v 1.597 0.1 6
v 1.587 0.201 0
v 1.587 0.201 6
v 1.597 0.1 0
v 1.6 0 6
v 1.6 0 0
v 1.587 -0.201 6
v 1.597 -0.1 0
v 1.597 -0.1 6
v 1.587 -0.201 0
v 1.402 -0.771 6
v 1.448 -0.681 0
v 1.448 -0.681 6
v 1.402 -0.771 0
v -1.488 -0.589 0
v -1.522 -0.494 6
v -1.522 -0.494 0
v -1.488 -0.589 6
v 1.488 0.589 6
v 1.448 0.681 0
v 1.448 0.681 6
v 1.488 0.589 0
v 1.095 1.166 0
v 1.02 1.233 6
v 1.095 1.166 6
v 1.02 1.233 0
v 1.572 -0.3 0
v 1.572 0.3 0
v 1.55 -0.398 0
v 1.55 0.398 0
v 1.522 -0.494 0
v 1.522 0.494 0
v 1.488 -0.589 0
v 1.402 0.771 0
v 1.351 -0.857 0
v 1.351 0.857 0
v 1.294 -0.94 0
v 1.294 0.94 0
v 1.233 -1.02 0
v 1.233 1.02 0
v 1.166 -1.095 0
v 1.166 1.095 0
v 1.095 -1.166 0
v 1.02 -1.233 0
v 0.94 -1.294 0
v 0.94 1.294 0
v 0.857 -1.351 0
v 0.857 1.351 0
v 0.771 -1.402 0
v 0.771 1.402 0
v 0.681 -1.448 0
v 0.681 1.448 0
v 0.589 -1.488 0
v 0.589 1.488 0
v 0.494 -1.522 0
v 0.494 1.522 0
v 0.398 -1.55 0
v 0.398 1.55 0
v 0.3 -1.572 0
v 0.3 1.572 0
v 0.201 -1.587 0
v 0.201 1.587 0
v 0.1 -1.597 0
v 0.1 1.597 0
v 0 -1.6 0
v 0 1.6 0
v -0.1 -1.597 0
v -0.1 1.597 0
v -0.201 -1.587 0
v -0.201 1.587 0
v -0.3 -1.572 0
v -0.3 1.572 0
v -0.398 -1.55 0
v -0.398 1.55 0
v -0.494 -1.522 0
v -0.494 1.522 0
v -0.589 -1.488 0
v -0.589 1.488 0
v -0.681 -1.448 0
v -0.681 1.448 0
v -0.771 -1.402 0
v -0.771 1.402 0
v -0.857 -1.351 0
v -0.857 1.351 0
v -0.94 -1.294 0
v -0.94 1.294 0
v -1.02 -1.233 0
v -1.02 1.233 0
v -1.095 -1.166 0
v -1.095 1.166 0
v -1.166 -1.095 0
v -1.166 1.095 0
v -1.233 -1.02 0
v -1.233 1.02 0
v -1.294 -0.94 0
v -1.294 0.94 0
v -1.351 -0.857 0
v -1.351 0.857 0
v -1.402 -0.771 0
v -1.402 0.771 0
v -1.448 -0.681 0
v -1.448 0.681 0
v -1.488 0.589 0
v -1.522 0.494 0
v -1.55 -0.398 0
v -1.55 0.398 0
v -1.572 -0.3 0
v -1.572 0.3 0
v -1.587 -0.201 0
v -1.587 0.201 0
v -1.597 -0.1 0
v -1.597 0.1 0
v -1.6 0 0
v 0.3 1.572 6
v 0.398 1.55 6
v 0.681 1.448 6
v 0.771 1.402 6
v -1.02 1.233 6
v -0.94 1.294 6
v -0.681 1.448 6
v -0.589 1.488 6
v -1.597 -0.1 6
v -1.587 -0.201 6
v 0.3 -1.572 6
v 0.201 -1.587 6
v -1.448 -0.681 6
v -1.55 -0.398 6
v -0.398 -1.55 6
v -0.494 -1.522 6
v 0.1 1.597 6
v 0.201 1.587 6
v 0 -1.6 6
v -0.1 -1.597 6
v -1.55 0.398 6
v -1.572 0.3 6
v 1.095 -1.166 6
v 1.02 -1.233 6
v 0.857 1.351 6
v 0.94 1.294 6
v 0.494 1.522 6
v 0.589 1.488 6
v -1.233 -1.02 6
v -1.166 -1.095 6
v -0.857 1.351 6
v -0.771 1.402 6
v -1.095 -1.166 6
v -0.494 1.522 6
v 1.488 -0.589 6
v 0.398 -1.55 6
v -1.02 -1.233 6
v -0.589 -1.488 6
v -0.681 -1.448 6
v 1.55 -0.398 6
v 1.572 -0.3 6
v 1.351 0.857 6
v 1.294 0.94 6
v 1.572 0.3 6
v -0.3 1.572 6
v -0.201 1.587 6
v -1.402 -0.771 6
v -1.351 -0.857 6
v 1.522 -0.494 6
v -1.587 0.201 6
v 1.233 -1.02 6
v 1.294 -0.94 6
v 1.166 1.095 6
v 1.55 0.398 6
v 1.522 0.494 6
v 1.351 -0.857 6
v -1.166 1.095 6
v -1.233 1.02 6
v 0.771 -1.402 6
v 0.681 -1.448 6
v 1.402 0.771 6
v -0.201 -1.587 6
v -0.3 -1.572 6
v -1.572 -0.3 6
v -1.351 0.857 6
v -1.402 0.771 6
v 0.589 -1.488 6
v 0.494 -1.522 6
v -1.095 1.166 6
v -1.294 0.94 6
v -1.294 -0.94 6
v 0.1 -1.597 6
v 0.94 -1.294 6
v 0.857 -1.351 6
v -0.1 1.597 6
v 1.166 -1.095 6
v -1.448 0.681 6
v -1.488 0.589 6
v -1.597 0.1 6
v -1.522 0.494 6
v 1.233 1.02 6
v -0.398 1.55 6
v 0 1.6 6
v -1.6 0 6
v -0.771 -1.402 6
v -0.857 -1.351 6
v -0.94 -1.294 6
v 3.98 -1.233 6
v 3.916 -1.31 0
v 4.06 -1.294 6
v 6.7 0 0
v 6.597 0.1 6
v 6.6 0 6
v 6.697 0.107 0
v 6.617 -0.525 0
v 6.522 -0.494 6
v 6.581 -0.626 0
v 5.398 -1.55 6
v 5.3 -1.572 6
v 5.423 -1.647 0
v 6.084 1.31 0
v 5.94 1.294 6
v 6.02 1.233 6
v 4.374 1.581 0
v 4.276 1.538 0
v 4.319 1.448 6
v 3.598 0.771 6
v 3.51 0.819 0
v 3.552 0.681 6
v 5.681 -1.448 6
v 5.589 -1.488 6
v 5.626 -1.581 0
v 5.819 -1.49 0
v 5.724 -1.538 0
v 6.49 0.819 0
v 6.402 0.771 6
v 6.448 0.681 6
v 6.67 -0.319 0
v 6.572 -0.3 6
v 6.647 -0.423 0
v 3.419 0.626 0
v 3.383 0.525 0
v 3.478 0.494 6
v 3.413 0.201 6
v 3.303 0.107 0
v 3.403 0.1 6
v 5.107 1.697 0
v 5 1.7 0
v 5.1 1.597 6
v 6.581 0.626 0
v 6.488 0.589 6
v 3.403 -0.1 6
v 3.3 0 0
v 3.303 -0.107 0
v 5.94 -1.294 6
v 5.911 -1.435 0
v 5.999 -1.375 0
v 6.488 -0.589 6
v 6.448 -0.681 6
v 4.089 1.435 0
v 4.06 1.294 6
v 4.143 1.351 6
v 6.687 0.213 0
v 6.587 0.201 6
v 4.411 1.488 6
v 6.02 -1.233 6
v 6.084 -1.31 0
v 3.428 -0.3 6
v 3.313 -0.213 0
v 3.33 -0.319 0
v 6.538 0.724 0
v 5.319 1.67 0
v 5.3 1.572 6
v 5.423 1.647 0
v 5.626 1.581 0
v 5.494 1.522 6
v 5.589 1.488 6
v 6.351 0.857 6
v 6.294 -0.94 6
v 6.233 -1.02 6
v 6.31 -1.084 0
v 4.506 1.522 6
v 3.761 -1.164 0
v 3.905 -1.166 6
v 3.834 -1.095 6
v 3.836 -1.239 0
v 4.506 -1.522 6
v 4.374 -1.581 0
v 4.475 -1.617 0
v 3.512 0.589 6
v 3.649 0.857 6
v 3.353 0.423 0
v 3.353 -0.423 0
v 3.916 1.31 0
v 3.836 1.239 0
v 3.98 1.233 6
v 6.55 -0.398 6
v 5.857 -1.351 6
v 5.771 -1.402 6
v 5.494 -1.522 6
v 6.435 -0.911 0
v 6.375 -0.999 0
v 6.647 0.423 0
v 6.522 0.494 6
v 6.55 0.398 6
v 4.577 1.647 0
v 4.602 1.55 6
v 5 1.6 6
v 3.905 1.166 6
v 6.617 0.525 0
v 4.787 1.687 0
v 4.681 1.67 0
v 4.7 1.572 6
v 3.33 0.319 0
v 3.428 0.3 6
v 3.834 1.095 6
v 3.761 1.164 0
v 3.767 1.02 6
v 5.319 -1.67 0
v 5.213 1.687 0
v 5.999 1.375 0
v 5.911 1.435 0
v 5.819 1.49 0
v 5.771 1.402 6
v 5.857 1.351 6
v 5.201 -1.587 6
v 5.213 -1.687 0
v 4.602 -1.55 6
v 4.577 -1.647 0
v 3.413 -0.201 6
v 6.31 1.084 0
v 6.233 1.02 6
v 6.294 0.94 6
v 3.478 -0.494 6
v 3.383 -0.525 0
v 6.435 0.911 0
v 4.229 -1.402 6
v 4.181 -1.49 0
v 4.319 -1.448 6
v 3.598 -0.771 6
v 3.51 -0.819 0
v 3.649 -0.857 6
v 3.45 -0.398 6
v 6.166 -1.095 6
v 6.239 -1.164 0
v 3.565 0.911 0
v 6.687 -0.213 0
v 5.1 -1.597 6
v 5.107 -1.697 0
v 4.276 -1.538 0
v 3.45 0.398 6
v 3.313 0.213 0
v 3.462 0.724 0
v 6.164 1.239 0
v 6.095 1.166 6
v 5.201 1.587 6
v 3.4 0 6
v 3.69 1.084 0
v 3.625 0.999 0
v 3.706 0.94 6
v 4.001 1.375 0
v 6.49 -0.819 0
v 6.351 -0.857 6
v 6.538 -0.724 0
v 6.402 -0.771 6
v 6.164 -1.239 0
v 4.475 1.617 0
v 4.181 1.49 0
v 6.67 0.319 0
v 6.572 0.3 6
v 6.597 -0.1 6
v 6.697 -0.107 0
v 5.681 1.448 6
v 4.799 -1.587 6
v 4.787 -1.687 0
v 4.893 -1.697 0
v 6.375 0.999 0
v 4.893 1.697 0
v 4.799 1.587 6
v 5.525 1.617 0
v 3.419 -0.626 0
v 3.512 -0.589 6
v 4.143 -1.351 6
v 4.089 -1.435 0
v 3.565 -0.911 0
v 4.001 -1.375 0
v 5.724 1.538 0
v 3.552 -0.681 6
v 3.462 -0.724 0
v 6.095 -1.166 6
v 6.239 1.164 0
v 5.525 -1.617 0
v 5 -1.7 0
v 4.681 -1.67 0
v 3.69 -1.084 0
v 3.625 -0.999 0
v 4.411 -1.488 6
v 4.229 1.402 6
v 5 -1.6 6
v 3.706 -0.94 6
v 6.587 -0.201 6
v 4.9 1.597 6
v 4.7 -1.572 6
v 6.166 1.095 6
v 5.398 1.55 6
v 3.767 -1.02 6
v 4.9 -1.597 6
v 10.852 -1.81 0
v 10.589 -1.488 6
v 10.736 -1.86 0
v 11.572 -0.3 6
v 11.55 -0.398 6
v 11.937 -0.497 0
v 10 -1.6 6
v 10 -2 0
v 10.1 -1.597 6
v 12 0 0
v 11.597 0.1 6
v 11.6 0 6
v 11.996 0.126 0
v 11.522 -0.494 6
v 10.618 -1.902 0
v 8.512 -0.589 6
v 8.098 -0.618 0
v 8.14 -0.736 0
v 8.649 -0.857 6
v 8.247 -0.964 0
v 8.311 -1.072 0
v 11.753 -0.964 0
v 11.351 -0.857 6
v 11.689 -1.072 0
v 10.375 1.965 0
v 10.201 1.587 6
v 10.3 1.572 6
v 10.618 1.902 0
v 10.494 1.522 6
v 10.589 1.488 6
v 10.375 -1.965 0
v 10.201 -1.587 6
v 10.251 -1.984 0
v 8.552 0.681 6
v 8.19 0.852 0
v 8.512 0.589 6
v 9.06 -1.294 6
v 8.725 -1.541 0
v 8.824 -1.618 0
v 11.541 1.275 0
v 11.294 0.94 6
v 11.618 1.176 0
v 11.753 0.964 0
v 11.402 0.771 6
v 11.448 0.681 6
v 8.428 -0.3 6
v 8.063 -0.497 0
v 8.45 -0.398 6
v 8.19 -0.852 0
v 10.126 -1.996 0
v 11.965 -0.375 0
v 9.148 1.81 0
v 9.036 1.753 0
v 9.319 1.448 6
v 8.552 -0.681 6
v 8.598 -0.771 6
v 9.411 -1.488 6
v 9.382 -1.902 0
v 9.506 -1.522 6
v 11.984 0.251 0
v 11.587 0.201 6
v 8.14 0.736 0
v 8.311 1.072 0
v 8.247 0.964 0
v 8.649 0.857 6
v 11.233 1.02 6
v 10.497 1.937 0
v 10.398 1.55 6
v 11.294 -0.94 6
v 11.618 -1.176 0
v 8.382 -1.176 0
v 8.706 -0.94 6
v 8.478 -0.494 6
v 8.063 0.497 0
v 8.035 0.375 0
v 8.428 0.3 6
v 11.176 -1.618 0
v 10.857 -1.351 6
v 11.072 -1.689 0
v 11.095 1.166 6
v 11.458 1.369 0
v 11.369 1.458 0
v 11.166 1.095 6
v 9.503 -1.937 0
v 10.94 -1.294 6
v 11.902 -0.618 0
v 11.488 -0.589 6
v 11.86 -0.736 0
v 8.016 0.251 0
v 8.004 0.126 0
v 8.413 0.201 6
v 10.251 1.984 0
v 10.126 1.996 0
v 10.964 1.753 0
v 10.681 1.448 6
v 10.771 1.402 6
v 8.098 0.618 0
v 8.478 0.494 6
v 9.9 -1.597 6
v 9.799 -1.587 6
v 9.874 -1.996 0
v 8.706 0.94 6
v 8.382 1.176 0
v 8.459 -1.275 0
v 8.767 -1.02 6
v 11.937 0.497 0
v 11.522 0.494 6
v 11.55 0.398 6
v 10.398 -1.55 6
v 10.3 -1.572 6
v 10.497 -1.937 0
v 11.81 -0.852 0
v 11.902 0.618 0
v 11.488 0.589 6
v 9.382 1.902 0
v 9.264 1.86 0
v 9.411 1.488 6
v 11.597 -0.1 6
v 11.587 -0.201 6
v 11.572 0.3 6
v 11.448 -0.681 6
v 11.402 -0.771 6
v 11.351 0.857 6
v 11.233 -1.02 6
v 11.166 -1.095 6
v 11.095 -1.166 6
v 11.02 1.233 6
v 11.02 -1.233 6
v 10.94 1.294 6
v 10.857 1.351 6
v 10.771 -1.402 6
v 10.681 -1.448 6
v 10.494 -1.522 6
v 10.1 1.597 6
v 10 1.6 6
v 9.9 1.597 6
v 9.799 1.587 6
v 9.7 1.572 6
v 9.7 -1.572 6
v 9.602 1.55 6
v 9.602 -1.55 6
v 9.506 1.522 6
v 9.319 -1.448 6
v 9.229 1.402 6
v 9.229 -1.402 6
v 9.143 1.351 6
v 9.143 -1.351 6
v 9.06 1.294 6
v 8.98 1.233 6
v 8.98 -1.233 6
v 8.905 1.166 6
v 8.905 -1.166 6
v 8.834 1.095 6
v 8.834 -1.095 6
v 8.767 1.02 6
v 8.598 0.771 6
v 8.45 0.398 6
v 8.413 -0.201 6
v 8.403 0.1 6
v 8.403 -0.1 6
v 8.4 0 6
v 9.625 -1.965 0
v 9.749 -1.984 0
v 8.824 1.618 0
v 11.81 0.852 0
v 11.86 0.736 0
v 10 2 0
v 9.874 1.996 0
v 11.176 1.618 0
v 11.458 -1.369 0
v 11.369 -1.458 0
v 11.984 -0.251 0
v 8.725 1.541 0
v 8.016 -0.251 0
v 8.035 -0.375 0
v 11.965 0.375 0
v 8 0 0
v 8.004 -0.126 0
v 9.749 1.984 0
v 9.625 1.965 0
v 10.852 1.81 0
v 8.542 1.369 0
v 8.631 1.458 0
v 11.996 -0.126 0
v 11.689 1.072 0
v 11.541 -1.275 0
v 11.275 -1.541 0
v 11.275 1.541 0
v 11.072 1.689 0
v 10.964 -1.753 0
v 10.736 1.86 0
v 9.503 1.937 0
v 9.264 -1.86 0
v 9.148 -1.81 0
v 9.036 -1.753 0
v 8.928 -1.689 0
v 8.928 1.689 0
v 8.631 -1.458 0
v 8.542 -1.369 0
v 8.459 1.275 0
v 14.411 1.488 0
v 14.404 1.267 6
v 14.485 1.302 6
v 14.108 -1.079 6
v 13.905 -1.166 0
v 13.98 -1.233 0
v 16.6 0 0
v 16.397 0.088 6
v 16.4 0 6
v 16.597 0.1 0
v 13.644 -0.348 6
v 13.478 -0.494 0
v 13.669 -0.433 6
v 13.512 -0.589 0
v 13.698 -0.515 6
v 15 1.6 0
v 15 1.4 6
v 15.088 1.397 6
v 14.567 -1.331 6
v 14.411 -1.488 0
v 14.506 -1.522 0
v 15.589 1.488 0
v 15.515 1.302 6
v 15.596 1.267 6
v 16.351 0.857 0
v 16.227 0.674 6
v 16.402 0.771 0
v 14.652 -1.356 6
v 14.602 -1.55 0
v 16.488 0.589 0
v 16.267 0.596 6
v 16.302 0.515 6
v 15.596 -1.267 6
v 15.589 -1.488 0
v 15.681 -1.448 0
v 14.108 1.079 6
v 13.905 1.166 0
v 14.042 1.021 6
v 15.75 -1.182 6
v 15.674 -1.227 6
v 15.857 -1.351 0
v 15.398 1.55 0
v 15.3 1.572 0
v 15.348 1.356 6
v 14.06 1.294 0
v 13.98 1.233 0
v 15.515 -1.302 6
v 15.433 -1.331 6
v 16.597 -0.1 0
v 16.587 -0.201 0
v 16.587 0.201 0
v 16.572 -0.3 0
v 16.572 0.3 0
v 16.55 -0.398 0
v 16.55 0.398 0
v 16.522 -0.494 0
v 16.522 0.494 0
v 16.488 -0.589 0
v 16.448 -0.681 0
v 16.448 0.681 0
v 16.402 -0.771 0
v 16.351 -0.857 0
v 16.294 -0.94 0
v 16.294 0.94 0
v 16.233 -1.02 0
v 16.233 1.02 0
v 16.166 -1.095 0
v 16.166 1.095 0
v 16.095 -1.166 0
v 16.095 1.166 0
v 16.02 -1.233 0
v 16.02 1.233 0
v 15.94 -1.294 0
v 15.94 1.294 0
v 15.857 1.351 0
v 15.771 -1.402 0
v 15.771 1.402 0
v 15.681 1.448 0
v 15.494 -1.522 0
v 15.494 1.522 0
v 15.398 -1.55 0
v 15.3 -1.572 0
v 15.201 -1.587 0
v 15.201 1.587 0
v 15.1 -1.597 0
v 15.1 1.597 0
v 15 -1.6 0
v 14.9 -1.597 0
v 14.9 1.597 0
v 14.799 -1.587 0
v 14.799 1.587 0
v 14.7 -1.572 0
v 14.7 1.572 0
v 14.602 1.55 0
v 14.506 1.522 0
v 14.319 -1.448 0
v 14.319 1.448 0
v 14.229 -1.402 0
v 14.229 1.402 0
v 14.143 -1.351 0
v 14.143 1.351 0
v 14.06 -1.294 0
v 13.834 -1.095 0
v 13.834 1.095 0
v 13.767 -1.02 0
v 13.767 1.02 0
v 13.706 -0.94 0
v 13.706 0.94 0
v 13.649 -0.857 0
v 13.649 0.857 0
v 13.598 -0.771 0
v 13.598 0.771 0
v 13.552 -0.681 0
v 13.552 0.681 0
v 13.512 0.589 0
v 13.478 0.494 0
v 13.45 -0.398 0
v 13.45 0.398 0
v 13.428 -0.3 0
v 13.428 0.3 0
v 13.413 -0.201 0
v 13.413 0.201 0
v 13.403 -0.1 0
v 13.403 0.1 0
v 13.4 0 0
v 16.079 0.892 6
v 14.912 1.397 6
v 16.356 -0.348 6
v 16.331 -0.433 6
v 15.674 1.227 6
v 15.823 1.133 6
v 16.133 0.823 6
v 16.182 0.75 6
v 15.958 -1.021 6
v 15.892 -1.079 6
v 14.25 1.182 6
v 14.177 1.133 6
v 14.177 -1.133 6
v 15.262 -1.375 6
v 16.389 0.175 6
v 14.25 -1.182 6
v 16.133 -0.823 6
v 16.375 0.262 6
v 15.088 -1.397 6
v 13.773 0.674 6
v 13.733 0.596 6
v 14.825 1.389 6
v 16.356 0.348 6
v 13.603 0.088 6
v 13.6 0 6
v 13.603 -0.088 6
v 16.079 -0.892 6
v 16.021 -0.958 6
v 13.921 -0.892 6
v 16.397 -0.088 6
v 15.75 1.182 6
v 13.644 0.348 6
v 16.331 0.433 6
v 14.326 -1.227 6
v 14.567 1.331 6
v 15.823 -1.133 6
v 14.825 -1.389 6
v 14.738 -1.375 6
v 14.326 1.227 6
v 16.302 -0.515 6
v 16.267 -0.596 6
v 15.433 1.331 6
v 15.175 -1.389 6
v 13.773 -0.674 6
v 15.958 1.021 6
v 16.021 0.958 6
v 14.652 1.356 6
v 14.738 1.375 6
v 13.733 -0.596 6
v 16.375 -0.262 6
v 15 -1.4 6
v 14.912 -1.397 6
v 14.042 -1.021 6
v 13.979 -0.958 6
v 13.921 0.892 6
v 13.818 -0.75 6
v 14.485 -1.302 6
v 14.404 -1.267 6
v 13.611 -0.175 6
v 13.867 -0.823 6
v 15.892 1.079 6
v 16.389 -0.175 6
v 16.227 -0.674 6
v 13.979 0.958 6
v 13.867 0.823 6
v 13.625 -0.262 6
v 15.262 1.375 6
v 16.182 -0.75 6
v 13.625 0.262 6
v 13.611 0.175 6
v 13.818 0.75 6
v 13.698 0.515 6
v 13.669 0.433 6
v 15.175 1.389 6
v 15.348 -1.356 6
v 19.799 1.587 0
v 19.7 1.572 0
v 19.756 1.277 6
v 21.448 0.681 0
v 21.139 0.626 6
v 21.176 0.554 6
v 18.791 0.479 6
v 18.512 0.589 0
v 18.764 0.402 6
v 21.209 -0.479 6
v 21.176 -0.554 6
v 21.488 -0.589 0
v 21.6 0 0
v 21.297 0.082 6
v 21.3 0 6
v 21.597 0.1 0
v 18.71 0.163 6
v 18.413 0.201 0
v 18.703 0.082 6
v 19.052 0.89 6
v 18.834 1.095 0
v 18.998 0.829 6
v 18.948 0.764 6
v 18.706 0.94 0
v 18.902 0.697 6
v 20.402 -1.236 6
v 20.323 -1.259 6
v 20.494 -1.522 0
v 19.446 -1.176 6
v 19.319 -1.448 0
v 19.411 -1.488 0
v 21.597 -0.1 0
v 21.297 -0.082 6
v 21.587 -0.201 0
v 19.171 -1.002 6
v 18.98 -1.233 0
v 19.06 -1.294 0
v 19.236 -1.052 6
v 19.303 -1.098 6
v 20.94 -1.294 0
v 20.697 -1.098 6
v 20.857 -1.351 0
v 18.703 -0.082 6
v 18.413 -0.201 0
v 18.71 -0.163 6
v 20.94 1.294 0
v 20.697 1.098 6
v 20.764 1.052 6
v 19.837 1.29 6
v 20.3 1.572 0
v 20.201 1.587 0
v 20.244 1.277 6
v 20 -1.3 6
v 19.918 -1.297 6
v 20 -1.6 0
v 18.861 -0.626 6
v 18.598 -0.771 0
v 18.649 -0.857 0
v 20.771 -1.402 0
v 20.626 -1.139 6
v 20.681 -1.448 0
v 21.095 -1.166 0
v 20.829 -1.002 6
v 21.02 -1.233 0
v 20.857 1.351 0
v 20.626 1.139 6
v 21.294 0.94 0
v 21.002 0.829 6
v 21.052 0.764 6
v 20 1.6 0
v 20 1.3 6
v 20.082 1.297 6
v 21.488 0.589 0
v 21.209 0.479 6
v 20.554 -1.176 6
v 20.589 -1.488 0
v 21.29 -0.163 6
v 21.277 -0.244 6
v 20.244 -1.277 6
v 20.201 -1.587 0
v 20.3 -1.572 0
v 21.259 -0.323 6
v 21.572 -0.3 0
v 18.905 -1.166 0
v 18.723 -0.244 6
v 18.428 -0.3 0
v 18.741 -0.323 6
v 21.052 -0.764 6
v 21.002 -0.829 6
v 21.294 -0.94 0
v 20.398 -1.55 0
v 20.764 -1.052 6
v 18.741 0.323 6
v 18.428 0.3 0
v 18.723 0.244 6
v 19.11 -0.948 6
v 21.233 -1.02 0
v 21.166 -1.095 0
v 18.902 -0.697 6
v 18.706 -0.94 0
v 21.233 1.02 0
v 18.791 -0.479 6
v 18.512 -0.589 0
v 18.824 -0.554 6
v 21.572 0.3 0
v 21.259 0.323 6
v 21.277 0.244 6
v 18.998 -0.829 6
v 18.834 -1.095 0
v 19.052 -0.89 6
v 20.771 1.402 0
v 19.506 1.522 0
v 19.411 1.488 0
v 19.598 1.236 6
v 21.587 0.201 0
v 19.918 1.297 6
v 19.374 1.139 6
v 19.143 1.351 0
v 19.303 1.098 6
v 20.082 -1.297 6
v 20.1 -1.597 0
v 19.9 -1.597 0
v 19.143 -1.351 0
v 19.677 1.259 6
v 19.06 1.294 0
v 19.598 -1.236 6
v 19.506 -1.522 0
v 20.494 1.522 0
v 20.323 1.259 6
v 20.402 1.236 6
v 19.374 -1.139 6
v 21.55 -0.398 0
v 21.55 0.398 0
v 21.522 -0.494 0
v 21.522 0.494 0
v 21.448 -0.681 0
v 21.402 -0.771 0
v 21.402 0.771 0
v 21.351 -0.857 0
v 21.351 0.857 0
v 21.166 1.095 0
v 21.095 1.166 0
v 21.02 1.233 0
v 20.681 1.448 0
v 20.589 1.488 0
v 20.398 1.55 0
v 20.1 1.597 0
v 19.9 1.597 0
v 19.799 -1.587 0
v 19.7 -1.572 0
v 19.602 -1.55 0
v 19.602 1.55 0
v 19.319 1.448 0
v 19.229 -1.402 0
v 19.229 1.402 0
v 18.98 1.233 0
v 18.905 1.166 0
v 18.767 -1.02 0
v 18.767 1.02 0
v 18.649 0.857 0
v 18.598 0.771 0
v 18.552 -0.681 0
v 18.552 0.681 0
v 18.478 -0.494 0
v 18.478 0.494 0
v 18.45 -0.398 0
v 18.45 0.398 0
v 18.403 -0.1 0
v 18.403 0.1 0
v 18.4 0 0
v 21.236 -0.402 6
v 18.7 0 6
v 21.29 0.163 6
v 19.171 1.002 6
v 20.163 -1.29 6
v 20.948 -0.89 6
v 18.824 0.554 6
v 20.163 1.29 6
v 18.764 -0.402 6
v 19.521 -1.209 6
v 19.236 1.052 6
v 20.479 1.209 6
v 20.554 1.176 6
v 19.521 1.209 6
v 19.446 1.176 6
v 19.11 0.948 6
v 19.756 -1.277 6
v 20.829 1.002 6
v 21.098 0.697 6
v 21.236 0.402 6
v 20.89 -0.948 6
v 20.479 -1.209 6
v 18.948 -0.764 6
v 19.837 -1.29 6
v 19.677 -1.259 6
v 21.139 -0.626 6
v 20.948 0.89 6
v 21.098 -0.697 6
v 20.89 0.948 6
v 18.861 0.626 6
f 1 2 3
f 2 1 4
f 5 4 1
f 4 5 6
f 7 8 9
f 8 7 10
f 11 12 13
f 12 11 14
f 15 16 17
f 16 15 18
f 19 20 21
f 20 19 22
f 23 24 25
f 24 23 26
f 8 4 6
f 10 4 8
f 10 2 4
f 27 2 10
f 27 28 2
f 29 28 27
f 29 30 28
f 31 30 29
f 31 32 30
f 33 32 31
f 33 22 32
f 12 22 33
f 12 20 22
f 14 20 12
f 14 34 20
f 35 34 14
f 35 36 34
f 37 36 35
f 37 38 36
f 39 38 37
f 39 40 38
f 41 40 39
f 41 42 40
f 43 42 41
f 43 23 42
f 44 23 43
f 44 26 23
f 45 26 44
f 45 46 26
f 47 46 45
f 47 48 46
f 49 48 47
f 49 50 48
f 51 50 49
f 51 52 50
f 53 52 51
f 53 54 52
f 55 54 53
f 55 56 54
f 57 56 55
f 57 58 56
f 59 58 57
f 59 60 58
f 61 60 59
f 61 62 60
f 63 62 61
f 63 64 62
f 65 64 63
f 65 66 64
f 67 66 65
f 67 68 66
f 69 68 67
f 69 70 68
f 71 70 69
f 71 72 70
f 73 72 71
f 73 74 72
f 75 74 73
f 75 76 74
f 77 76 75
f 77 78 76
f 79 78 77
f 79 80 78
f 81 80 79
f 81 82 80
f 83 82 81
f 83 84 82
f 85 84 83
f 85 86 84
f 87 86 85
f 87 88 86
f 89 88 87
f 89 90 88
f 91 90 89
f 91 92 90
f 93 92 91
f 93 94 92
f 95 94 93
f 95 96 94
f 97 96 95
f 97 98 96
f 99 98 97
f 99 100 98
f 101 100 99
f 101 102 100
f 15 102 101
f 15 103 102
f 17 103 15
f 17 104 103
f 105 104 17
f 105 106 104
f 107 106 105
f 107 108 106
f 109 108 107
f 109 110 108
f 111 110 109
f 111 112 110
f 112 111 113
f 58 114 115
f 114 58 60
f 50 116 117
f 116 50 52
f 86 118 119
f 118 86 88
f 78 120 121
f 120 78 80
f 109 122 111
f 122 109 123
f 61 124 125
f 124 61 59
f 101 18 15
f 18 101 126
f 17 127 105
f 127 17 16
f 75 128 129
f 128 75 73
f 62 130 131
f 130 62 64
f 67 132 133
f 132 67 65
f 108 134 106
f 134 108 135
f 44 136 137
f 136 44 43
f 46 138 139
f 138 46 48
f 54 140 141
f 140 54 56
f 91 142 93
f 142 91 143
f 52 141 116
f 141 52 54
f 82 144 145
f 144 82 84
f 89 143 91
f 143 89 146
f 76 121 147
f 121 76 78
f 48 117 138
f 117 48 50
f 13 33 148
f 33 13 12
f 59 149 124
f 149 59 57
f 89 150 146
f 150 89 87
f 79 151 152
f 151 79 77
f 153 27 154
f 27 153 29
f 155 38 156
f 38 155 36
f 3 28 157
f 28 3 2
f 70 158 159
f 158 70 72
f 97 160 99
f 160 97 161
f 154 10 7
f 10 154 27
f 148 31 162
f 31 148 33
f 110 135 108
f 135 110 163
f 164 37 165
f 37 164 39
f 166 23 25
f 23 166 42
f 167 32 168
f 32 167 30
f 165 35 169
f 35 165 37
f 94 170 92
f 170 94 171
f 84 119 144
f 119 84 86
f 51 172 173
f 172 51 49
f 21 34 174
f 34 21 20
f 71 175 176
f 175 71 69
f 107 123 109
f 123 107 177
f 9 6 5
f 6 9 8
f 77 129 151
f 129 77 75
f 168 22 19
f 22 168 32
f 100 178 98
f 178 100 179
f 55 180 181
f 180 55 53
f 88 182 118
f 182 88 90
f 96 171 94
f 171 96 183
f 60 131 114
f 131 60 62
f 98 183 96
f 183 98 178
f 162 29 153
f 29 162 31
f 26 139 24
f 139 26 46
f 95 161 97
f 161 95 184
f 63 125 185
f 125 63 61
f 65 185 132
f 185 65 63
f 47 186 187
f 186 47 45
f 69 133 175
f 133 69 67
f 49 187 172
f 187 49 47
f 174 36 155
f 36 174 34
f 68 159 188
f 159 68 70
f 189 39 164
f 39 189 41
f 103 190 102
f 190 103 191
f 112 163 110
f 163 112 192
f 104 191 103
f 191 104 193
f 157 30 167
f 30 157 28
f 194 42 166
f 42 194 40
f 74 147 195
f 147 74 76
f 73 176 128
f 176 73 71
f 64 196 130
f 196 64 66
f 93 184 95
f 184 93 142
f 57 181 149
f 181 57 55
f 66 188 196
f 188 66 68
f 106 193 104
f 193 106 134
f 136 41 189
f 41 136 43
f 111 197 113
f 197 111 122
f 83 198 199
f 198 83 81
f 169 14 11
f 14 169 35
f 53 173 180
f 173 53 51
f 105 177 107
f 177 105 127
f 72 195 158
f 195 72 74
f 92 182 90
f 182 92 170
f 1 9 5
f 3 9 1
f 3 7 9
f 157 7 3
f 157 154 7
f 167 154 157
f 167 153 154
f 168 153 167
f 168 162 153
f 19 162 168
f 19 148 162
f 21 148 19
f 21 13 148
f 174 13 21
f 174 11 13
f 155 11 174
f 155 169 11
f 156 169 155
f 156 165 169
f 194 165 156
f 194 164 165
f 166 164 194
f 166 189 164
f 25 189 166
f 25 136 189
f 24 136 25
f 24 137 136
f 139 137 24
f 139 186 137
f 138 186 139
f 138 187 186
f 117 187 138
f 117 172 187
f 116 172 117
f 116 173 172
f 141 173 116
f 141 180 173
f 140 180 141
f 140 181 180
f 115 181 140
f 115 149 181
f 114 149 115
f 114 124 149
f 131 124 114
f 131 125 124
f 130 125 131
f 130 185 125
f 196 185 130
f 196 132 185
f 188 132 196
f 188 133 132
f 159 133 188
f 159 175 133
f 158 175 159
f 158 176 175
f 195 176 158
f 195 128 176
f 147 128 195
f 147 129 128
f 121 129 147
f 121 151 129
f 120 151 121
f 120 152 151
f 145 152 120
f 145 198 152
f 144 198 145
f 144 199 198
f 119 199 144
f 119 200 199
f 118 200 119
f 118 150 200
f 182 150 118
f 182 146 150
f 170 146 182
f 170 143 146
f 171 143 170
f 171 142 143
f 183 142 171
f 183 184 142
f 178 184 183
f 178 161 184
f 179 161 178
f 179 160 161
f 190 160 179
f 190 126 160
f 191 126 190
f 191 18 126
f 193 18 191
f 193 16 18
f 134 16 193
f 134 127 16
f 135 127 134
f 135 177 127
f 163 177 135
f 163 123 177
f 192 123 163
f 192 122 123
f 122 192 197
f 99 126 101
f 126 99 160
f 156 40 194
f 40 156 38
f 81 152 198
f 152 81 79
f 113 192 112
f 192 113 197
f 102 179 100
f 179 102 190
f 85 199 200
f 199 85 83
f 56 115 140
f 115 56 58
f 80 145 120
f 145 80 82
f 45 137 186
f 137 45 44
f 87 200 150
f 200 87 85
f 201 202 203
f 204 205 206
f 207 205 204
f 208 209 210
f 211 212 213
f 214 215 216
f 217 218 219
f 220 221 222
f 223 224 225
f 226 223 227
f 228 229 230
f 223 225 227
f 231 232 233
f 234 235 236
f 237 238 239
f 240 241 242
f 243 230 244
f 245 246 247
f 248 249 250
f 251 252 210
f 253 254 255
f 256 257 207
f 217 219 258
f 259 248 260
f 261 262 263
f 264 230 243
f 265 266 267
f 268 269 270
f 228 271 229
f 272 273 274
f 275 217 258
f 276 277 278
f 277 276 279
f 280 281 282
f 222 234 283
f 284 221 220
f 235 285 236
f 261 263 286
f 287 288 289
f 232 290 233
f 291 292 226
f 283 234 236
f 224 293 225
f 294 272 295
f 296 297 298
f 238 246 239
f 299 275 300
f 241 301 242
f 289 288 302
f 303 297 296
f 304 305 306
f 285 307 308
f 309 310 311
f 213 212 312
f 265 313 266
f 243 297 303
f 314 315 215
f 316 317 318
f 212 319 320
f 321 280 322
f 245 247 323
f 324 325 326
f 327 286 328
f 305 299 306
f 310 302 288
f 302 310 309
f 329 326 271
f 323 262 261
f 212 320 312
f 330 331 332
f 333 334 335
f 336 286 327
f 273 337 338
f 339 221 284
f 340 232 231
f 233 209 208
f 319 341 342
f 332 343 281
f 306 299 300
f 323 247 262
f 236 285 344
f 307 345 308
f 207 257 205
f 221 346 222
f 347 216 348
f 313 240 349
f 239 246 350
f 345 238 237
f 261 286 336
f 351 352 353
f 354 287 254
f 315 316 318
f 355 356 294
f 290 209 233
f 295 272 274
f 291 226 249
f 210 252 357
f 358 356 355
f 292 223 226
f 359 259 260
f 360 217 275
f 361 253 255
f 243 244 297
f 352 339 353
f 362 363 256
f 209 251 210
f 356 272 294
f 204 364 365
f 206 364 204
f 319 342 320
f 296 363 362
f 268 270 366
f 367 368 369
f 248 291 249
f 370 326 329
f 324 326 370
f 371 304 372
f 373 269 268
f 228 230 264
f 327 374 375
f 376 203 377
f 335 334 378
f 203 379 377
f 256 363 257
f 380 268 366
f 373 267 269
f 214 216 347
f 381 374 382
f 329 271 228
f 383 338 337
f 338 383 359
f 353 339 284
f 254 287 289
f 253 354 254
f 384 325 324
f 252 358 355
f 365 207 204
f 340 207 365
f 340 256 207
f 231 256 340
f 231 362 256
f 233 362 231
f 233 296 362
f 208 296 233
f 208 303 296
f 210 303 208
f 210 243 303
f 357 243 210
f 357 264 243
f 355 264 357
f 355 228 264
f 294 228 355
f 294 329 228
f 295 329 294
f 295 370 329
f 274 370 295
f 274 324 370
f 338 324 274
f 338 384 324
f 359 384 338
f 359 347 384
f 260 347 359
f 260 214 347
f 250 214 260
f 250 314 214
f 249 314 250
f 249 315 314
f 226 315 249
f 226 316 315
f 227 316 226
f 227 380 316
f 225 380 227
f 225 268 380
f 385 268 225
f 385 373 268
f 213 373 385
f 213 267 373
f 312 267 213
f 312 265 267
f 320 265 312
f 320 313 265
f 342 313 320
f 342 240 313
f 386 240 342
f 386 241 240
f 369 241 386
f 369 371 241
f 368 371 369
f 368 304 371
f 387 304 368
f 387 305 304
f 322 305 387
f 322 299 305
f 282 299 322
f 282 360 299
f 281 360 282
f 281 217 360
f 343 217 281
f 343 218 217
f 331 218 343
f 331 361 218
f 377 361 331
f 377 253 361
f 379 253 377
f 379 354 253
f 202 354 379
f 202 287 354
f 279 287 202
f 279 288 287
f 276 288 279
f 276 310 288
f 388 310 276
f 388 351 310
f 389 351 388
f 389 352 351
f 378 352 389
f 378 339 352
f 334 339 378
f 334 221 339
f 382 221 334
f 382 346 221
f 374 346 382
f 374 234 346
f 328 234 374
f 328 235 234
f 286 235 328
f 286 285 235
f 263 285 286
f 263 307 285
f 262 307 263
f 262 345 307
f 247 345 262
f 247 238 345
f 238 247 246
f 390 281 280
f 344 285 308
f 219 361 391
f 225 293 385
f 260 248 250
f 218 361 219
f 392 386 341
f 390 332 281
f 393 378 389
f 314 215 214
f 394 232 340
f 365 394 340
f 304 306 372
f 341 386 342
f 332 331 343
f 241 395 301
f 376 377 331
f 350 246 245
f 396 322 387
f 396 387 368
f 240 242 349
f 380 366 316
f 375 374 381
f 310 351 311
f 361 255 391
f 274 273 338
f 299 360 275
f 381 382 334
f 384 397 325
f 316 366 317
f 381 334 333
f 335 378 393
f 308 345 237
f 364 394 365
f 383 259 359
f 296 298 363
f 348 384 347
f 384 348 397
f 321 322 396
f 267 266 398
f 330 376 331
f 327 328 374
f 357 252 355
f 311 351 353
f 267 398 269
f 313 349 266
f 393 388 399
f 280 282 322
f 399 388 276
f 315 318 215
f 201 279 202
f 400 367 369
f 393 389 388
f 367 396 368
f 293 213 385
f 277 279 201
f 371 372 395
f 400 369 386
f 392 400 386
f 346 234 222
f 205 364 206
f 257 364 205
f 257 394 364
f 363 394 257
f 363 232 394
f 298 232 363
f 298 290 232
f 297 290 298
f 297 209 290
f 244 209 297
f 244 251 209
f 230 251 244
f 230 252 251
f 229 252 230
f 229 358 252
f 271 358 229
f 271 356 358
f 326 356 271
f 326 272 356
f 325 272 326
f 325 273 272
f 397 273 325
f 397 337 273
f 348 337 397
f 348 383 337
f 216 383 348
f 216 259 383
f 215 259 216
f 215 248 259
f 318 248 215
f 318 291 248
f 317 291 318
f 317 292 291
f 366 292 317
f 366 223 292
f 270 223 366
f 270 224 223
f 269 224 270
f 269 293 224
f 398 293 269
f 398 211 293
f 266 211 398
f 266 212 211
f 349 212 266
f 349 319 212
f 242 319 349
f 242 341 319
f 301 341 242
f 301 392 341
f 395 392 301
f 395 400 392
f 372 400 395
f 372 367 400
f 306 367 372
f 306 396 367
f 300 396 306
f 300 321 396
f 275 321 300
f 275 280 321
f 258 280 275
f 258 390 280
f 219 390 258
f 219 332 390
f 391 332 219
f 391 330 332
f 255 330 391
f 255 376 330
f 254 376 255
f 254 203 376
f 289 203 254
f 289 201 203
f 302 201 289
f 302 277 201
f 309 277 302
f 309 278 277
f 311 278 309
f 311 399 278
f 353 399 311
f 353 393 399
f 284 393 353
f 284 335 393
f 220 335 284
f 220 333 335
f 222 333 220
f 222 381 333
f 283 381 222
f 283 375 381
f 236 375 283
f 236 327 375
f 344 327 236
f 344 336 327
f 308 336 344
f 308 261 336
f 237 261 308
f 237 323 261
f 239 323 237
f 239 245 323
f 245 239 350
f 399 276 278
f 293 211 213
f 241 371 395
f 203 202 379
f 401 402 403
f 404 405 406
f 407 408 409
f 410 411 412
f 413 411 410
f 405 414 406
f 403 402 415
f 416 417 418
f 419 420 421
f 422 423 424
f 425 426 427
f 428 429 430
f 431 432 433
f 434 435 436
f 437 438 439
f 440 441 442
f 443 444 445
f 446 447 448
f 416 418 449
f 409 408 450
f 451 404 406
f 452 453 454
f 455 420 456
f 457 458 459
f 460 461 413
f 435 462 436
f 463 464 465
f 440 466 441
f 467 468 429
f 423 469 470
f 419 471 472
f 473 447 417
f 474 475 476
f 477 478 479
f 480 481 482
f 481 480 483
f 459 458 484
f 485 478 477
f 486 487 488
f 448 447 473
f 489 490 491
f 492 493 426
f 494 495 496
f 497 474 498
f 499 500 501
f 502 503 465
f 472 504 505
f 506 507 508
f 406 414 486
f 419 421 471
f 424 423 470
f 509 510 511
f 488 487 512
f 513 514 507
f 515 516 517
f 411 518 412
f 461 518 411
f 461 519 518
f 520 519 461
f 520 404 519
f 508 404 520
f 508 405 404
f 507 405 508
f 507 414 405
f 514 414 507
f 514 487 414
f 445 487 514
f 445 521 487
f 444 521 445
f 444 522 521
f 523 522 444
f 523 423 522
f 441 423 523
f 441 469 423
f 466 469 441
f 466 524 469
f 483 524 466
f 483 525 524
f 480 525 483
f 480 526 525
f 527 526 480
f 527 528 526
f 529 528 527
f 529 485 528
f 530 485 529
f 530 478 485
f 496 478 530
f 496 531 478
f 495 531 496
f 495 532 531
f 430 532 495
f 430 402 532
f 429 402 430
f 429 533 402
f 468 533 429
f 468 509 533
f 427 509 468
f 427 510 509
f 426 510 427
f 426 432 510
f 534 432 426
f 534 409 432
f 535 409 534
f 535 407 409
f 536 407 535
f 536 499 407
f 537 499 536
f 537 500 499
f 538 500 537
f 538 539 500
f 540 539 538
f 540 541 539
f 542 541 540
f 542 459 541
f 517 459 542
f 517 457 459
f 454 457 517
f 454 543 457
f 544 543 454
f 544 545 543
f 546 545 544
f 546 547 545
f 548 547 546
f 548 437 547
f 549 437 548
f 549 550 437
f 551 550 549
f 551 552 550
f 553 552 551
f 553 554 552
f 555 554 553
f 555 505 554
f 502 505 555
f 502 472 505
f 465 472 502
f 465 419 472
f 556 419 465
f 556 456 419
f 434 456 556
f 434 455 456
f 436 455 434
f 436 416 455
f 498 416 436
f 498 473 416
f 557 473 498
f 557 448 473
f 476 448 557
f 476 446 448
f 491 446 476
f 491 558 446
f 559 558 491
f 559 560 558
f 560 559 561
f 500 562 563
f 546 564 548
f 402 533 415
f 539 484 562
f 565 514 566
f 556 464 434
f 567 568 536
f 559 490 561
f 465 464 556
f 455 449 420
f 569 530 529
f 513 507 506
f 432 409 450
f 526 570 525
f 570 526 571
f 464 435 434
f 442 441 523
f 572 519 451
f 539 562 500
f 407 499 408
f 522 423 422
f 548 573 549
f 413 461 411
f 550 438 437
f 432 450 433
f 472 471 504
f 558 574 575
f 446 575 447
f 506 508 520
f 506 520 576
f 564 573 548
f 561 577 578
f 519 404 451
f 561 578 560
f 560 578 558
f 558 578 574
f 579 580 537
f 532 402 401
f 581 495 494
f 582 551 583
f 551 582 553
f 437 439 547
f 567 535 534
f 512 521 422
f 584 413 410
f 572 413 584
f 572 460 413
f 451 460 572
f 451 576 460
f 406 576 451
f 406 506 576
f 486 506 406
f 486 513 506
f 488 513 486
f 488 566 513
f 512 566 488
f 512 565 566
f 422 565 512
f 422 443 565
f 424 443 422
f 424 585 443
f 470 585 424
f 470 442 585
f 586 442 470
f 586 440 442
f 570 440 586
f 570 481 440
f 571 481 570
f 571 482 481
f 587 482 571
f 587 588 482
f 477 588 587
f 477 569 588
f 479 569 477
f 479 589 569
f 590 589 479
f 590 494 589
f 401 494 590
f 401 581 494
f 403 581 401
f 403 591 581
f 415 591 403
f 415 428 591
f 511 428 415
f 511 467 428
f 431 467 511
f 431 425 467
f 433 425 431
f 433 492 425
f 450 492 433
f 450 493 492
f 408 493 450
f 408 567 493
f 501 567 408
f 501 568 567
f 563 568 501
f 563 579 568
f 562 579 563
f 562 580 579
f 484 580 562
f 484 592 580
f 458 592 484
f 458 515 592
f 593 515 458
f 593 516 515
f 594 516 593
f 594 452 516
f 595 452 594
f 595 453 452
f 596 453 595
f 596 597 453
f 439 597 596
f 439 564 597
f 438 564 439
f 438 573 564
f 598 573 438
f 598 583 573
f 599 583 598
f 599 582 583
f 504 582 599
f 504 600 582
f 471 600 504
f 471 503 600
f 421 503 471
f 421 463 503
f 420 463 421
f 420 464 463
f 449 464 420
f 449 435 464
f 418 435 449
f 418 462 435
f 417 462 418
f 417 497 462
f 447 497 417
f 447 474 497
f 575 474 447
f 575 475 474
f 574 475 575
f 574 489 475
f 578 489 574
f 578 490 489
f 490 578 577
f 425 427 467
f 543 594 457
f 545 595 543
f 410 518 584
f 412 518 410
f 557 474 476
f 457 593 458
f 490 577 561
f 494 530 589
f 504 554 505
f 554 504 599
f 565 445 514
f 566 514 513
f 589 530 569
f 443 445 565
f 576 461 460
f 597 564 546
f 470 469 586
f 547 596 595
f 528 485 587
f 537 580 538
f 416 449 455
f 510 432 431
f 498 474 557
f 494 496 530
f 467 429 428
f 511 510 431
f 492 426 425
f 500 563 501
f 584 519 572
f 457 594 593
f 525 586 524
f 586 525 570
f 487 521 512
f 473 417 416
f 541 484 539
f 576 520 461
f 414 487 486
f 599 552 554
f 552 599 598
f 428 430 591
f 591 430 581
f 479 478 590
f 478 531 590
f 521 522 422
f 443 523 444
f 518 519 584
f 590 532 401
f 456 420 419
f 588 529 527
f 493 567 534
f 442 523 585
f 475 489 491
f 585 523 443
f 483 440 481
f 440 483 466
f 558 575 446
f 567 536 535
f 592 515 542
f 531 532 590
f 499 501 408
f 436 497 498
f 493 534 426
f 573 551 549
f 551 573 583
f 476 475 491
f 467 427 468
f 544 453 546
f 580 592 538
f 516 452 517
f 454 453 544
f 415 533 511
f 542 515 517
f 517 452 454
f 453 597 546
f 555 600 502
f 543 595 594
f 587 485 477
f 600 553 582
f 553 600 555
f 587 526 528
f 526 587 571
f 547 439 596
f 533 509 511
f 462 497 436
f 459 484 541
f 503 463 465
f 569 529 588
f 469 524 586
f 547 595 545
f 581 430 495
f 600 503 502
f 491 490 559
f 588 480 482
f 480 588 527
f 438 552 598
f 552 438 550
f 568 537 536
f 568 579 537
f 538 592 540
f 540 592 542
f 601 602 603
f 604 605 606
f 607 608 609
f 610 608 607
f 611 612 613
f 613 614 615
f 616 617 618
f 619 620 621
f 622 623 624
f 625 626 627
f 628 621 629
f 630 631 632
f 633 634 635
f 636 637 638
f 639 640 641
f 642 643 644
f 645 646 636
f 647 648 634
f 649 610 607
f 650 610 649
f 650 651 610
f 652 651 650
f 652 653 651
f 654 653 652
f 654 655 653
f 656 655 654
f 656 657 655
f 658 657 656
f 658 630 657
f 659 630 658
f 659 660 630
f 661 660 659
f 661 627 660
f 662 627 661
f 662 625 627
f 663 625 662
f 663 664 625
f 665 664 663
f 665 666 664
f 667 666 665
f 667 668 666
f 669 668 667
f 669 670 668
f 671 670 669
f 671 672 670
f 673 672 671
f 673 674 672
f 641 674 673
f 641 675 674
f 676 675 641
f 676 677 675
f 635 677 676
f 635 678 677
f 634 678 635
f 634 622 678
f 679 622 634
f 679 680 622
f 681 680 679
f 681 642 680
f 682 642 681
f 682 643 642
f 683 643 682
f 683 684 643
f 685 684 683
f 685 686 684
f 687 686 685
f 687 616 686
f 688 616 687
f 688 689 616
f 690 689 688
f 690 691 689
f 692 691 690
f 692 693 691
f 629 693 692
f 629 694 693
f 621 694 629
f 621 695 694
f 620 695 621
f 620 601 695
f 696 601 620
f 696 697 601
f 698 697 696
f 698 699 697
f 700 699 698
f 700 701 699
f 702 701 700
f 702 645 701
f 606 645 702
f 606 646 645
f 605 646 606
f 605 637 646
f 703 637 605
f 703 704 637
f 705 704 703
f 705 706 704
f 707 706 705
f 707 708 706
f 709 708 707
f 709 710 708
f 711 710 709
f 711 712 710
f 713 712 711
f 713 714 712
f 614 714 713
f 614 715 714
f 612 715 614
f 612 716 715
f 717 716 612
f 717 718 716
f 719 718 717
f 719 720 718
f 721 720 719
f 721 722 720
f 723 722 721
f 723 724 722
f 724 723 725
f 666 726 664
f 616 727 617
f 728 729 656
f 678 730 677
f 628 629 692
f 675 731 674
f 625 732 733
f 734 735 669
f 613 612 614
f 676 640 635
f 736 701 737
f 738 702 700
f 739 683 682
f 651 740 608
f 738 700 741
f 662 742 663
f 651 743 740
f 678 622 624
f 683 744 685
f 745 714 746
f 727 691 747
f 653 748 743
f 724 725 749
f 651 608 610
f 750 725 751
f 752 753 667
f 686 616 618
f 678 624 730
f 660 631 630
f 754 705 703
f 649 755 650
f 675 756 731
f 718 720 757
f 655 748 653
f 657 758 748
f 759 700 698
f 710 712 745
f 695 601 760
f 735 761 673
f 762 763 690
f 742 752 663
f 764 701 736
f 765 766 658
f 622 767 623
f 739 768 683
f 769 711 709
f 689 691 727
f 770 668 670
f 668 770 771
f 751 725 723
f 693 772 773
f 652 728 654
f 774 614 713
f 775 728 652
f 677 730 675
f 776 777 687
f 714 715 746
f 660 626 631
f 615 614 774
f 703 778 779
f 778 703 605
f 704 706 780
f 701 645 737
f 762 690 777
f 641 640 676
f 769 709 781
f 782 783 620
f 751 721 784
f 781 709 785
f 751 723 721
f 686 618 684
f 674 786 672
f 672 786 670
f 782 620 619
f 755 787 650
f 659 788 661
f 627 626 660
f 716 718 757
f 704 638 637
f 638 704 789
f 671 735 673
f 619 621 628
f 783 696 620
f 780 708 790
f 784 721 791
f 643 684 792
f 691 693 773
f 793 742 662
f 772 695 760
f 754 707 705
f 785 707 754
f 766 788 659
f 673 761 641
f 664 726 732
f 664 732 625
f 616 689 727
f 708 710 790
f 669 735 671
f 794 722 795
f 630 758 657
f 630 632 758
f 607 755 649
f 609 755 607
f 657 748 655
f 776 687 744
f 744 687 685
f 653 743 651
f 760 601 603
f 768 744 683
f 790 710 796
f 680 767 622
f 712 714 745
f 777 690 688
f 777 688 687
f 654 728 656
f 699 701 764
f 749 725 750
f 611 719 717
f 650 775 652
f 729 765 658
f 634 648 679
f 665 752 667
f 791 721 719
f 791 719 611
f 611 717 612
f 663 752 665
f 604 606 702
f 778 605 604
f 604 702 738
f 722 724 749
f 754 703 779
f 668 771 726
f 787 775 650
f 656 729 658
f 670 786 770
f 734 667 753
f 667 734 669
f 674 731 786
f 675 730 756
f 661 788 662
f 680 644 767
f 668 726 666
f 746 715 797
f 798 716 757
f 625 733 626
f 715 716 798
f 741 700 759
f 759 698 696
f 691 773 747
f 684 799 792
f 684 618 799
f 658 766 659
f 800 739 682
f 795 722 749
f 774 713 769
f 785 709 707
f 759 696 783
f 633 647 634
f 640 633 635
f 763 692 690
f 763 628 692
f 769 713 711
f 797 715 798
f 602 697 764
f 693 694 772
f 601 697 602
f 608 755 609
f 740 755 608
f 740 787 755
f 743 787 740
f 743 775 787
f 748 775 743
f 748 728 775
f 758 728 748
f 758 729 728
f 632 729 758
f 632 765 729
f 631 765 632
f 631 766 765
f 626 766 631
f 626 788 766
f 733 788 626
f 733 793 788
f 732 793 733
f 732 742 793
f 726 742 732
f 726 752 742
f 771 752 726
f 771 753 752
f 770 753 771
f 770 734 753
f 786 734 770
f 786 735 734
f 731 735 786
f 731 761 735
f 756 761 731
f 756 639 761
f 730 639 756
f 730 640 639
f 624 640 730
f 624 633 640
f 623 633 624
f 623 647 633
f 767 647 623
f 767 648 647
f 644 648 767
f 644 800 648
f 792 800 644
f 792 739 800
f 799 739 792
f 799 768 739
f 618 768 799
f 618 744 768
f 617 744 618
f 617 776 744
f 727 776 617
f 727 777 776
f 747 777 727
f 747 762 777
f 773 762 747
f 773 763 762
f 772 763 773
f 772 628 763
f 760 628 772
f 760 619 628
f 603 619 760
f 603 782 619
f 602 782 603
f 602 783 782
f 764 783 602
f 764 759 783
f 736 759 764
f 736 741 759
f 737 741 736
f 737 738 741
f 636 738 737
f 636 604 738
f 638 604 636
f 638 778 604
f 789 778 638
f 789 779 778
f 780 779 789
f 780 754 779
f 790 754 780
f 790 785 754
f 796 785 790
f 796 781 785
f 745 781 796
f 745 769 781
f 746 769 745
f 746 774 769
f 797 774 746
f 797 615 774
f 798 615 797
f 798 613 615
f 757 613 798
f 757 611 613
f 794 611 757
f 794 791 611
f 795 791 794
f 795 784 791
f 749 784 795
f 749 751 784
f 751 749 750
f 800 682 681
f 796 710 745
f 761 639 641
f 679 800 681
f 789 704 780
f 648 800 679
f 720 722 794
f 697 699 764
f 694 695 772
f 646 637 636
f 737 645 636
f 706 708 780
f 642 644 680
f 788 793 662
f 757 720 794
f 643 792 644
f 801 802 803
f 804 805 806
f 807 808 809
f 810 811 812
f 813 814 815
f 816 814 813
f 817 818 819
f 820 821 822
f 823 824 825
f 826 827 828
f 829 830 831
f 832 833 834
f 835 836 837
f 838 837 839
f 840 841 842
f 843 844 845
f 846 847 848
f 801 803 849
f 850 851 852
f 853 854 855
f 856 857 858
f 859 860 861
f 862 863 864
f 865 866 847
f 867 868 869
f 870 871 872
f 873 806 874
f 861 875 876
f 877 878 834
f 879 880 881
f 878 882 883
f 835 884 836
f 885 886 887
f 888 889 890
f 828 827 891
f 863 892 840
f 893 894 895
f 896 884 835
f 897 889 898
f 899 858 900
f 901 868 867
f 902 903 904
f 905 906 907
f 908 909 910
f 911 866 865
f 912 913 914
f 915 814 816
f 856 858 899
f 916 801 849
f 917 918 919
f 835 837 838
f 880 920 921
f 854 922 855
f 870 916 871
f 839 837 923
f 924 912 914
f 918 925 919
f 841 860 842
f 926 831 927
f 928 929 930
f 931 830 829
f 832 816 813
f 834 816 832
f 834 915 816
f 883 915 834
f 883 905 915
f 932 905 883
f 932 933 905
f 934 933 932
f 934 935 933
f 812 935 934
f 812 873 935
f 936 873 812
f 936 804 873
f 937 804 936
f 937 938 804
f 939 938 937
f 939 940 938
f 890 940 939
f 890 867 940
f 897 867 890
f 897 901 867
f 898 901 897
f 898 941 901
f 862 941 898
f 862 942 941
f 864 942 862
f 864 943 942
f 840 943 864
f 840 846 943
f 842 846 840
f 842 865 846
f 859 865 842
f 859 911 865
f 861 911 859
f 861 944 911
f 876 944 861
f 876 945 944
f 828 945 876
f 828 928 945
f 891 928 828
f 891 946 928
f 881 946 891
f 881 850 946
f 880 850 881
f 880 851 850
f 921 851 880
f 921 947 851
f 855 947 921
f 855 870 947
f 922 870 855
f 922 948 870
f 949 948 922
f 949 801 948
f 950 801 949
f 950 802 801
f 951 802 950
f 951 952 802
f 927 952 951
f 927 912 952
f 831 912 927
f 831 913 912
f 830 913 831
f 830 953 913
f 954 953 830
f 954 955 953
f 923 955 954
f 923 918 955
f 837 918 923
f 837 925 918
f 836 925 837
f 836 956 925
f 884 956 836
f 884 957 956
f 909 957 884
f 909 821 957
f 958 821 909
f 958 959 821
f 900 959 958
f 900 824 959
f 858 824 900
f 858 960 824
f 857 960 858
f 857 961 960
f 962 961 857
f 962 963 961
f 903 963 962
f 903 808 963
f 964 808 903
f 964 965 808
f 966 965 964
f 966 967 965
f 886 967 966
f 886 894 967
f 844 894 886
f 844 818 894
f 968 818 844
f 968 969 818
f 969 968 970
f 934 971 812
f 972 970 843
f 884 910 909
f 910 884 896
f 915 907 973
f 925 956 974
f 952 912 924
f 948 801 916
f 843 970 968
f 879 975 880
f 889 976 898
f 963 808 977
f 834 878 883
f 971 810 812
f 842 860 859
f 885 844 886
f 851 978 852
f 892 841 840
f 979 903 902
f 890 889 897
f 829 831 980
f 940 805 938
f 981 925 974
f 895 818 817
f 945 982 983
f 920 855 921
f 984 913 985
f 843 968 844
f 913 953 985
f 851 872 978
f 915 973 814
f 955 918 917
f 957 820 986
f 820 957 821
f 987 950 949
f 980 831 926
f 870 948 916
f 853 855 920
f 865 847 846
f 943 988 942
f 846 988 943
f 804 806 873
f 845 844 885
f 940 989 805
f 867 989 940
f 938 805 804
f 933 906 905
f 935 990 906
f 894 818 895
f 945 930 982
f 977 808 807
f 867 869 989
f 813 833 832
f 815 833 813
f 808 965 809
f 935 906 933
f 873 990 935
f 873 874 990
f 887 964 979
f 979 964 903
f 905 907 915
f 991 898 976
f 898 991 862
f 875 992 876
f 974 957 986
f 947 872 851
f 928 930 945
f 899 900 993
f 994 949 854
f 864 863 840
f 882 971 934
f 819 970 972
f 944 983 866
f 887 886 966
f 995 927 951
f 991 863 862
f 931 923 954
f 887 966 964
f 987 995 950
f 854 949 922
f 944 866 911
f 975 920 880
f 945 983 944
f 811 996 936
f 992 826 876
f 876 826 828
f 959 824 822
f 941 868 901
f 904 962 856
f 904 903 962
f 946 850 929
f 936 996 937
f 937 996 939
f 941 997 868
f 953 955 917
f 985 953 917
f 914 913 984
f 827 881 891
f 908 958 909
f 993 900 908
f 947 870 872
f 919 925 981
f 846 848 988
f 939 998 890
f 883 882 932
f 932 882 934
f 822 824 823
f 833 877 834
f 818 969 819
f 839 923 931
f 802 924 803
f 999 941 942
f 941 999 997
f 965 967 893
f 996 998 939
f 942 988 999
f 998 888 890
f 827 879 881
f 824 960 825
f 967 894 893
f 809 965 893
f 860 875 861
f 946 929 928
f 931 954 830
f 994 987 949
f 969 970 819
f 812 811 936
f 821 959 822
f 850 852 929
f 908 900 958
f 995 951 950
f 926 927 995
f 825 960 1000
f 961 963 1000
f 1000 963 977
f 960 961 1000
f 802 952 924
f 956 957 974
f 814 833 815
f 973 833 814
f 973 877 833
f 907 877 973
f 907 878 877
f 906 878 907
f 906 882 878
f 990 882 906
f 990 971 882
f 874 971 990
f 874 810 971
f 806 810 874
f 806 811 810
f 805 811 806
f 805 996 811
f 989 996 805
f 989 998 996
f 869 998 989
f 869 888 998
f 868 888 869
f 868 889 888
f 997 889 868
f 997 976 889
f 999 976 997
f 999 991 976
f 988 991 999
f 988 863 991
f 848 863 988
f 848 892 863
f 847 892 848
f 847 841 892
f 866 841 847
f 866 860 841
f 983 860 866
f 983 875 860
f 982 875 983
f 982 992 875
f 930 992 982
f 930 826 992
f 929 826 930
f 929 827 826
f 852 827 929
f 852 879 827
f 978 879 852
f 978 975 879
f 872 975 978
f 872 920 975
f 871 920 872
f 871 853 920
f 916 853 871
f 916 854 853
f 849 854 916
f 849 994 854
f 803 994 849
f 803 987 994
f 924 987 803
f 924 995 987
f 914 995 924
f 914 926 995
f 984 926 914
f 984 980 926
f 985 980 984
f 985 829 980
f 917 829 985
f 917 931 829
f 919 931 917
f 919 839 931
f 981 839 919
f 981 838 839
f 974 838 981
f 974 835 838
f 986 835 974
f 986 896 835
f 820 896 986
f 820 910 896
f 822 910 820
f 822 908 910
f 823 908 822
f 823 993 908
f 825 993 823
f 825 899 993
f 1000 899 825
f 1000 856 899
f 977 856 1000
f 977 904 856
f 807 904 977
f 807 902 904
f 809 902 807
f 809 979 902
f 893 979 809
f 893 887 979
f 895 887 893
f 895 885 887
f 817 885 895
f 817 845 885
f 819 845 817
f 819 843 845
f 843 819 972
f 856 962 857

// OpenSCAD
// file: ../../helpers/helpers.scad
module modSlot(translate, rotate, size, slack, shipOrModule) {
	
		realSlack = shipOrModule == false ? slack : -slack;

		newSize = [size[0] + realSlack, size[1] + realSlack, size[2] + realSlack];

	translate(translate)
	rotate(rotate)
		cube(size=newSize, center= true);
}

module wingSlot(translate, rotate, size, slack, shipOrModule) {
	modSlot(translate, rotate, size, slack, shipOrModule);
}

module engineSlot(translate, rotate, size, slack, shipOrModule) {
	modSlot(translate, rotate, size, slack, shipOrModule);
}

module poleSlot(translate, rotate, size, slack, shipOrModule) {
	modSlot(translate, rotate, size, slack, shipOrModule);
}
// main file
// licensed under the Creative Commons - GNU GPL license.

use <../../helpers/helpers.scad>

slack = 0;

module load() {
	cylinder( 6, 1.6, 1.6, $fn = 100);

	translate([5,0,0]) 
	{
		cylinder( 6, 1.7, 1.6, $fn = 100);
	}

	translate([10,0,0]) 
	{
		cylinder( 6, 2, 1.6, $fn = 100);
	}
	translate([15,0,0]) 
	{
		cylinder( 6, 1.6, 1.4, $fn = 100);
	}
	translate([20,0,0]) 
	{
		cylinder( 6, 1.6, 1.3, $fn = 100);
	}
}

load();
